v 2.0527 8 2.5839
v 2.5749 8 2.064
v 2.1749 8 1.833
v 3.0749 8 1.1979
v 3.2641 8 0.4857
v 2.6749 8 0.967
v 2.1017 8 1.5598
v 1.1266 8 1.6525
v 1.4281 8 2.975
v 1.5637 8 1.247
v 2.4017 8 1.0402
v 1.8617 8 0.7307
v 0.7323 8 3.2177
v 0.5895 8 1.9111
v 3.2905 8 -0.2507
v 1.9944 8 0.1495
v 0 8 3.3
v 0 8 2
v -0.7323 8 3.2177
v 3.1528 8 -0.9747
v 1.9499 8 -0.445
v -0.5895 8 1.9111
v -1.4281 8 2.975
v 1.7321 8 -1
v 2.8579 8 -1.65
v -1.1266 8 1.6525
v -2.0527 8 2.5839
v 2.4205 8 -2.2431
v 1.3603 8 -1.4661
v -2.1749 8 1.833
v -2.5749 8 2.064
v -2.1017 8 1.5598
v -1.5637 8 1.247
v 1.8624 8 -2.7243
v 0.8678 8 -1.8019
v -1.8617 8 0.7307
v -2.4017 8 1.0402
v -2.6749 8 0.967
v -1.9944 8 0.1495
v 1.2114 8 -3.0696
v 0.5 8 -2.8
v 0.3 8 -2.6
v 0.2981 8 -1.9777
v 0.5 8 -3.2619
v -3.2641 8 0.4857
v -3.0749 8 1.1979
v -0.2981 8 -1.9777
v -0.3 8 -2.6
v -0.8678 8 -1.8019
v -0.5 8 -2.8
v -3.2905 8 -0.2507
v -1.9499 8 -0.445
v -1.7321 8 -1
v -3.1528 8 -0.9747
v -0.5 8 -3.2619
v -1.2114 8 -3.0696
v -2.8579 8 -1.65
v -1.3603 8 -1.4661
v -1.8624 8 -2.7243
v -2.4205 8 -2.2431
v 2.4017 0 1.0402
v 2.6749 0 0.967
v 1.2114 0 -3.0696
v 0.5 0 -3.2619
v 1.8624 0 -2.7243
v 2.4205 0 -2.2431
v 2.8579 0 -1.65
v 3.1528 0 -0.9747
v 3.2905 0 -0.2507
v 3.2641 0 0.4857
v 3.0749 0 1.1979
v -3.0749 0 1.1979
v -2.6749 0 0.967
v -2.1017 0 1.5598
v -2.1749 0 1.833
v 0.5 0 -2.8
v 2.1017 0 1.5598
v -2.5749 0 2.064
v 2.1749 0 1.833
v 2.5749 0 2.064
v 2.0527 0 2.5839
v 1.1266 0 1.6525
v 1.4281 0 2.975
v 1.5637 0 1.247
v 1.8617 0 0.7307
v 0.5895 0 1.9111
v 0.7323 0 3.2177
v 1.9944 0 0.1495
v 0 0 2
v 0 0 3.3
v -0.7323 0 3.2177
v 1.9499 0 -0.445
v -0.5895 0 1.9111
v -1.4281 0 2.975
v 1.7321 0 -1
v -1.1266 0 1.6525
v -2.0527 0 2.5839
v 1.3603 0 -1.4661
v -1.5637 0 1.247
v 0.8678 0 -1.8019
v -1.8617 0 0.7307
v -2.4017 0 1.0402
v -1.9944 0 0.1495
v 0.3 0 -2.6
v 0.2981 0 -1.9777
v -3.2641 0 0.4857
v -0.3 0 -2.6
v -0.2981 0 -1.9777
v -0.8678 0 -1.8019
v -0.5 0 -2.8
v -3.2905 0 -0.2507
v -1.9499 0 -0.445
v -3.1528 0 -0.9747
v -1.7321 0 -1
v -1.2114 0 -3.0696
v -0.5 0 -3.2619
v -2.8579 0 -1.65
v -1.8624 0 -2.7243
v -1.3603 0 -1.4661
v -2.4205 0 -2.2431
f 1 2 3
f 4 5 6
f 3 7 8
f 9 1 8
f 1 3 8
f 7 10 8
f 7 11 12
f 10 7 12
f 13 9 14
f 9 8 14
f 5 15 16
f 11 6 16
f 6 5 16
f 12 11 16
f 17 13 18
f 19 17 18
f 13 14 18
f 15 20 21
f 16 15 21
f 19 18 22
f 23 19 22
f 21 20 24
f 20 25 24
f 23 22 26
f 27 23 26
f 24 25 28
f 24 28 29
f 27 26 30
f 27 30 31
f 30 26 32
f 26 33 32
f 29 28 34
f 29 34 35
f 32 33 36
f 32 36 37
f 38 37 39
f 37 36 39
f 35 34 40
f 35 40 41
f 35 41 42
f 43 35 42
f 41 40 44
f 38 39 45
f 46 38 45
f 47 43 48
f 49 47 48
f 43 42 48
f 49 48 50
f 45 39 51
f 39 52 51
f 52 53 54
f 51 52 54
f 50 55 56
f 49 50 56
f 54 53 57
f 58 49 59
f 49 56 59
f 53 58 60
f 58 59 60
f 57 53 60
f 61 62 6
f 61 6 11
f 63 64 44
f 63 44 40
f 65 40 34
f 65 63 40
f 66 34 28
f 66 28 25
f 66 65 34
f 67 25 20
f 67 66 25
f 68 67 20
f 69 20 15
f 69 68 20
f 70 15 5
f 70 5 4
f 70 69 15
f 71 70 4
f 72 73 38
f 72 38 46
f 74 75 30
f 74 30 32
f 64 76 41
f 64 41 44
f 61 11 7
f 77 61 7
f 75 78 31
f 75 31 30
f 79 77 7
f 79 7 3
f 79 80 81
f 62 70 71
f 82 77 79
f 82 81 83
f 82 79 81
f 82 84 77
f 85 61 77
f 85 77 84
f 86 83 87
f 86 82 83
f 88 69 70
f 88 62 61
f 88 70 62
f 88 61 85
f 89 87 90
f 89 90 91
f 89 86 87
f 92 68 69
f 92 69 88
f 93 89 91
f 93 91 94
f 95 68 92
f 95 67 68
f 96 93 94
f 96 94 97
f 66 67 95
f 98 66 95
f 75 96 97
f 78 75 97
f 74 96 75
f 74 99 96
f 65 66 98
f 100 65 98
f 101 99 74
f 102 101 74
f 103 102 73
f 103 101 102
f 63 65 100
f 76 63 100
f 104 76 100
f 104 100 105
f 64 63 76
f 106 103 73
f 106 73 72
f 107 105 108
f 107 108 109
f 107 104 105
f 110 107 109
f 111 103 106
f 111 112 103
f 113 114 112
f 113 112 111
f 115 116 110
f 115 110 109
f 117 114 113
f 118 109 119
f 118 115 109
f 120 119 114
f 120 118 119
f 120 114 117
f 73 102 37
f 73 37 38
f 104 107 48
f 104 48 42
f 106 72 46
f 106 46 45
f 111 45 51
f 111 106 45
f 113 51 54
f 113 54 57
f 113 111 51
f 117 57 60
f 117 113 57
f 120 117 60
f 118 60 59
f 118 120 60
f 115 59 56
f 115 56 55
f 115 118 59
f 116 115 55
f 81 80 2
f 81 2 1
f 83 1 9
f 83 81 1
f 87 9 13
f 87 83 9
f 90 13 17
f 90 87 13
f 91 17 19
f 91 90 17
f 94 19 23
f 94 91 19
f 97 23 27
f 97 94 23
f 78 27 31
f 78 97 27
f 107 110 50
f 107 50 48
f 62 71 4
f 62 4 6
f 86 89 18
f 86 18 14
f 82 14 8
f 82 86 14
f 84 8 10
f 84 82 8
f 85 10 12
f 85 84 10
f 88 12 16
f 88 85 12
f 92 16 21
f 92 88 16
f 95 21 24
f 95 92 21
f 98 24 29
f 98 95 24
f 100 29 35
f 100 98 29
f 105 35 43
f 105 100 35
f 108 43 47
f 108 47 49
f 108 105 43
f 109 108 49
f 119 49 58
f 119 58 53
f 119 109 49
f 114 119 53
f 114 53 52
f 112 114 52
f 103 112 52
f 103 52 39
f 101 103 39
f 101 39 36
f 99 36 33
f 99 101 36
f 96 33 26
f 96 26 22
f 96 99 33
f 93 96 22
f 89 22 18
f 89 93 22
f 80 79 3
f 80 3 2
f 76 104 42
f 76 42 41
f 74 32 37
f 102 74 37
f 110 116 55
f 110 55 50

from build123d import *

# Parameters (mm, degrees)
SKETCH1_R           = 2
BOSS_EXTRUDE1_DEPTH = 8


with BuildPart() as part:
    # Sketch1 → Boss-Extrude1 (new body)
    with BuildSketch(Plane(origin=(0, 0, 0), x_dir=(1, 0, 0), z_dir=(0, 1, 0))):
        with BuildLine():
            Line((-0.5, 2.8), (-0.3, 2.6))
            Line((-0.3, 2.6), (0.3, 2.6))
            Line((0.3, 2.6), (0.5, 2.8))
            Line((0.5, 2.8), (0.5, 3.261901286))
            ThreePointArc((0.5, 3.261901286), (2.857883832, 1.65), (3.074889378, -1.197937941))
            Line((3.074889378, -1.197937941), (2.674871131, -0.966987298))
            Line((2.674871131, -0.966987298), (2.40166605, -1.040192379))
            Line((2.40166605, -1.040192379), (2.10166605, -1.559807621))
            Line((2.10166605, -1.559807621), (2.174871131, -1.833012702))
            Line((2.174871131, -1.833012702), (2.574889378, -2.063963345))
            ThreePointArc((2.574889378, -2.063963345), (0, -3.3), (-2.574889378, -2.063963345))
            Line((-2.574889378, -2.063963345), (-2.174871131, -1.833012702))
            Line((-2.174871131, -1.833012702), (-2.10166605, -1.559807621))
            Line((-2.10166605, -1.559807621), (-2.40166605, -1.040192379))
            Line((-2.40166605, -1.040192379), (-2.674871131, -0.966987298))
            Line((-2.674871131, -0.966987298), (-3.074889378, -1.197937941))
            ThreePointArc((-3.074889378, -1.197937941), (-2.857883832, 1.65), (-0.5, 3.261901286))
            Line((-0.5, 3.261901286), (-0.5, 2.8))
        make_face()
        with Locations(Location((0, 0, 0), (0, 0, 270))):
            Circle(SKETCH1_R, mode=Mode.SUBTRACT)
    extrude(amount=BOSS_EXTRUDE1_DEPTH)


solid = part.part
